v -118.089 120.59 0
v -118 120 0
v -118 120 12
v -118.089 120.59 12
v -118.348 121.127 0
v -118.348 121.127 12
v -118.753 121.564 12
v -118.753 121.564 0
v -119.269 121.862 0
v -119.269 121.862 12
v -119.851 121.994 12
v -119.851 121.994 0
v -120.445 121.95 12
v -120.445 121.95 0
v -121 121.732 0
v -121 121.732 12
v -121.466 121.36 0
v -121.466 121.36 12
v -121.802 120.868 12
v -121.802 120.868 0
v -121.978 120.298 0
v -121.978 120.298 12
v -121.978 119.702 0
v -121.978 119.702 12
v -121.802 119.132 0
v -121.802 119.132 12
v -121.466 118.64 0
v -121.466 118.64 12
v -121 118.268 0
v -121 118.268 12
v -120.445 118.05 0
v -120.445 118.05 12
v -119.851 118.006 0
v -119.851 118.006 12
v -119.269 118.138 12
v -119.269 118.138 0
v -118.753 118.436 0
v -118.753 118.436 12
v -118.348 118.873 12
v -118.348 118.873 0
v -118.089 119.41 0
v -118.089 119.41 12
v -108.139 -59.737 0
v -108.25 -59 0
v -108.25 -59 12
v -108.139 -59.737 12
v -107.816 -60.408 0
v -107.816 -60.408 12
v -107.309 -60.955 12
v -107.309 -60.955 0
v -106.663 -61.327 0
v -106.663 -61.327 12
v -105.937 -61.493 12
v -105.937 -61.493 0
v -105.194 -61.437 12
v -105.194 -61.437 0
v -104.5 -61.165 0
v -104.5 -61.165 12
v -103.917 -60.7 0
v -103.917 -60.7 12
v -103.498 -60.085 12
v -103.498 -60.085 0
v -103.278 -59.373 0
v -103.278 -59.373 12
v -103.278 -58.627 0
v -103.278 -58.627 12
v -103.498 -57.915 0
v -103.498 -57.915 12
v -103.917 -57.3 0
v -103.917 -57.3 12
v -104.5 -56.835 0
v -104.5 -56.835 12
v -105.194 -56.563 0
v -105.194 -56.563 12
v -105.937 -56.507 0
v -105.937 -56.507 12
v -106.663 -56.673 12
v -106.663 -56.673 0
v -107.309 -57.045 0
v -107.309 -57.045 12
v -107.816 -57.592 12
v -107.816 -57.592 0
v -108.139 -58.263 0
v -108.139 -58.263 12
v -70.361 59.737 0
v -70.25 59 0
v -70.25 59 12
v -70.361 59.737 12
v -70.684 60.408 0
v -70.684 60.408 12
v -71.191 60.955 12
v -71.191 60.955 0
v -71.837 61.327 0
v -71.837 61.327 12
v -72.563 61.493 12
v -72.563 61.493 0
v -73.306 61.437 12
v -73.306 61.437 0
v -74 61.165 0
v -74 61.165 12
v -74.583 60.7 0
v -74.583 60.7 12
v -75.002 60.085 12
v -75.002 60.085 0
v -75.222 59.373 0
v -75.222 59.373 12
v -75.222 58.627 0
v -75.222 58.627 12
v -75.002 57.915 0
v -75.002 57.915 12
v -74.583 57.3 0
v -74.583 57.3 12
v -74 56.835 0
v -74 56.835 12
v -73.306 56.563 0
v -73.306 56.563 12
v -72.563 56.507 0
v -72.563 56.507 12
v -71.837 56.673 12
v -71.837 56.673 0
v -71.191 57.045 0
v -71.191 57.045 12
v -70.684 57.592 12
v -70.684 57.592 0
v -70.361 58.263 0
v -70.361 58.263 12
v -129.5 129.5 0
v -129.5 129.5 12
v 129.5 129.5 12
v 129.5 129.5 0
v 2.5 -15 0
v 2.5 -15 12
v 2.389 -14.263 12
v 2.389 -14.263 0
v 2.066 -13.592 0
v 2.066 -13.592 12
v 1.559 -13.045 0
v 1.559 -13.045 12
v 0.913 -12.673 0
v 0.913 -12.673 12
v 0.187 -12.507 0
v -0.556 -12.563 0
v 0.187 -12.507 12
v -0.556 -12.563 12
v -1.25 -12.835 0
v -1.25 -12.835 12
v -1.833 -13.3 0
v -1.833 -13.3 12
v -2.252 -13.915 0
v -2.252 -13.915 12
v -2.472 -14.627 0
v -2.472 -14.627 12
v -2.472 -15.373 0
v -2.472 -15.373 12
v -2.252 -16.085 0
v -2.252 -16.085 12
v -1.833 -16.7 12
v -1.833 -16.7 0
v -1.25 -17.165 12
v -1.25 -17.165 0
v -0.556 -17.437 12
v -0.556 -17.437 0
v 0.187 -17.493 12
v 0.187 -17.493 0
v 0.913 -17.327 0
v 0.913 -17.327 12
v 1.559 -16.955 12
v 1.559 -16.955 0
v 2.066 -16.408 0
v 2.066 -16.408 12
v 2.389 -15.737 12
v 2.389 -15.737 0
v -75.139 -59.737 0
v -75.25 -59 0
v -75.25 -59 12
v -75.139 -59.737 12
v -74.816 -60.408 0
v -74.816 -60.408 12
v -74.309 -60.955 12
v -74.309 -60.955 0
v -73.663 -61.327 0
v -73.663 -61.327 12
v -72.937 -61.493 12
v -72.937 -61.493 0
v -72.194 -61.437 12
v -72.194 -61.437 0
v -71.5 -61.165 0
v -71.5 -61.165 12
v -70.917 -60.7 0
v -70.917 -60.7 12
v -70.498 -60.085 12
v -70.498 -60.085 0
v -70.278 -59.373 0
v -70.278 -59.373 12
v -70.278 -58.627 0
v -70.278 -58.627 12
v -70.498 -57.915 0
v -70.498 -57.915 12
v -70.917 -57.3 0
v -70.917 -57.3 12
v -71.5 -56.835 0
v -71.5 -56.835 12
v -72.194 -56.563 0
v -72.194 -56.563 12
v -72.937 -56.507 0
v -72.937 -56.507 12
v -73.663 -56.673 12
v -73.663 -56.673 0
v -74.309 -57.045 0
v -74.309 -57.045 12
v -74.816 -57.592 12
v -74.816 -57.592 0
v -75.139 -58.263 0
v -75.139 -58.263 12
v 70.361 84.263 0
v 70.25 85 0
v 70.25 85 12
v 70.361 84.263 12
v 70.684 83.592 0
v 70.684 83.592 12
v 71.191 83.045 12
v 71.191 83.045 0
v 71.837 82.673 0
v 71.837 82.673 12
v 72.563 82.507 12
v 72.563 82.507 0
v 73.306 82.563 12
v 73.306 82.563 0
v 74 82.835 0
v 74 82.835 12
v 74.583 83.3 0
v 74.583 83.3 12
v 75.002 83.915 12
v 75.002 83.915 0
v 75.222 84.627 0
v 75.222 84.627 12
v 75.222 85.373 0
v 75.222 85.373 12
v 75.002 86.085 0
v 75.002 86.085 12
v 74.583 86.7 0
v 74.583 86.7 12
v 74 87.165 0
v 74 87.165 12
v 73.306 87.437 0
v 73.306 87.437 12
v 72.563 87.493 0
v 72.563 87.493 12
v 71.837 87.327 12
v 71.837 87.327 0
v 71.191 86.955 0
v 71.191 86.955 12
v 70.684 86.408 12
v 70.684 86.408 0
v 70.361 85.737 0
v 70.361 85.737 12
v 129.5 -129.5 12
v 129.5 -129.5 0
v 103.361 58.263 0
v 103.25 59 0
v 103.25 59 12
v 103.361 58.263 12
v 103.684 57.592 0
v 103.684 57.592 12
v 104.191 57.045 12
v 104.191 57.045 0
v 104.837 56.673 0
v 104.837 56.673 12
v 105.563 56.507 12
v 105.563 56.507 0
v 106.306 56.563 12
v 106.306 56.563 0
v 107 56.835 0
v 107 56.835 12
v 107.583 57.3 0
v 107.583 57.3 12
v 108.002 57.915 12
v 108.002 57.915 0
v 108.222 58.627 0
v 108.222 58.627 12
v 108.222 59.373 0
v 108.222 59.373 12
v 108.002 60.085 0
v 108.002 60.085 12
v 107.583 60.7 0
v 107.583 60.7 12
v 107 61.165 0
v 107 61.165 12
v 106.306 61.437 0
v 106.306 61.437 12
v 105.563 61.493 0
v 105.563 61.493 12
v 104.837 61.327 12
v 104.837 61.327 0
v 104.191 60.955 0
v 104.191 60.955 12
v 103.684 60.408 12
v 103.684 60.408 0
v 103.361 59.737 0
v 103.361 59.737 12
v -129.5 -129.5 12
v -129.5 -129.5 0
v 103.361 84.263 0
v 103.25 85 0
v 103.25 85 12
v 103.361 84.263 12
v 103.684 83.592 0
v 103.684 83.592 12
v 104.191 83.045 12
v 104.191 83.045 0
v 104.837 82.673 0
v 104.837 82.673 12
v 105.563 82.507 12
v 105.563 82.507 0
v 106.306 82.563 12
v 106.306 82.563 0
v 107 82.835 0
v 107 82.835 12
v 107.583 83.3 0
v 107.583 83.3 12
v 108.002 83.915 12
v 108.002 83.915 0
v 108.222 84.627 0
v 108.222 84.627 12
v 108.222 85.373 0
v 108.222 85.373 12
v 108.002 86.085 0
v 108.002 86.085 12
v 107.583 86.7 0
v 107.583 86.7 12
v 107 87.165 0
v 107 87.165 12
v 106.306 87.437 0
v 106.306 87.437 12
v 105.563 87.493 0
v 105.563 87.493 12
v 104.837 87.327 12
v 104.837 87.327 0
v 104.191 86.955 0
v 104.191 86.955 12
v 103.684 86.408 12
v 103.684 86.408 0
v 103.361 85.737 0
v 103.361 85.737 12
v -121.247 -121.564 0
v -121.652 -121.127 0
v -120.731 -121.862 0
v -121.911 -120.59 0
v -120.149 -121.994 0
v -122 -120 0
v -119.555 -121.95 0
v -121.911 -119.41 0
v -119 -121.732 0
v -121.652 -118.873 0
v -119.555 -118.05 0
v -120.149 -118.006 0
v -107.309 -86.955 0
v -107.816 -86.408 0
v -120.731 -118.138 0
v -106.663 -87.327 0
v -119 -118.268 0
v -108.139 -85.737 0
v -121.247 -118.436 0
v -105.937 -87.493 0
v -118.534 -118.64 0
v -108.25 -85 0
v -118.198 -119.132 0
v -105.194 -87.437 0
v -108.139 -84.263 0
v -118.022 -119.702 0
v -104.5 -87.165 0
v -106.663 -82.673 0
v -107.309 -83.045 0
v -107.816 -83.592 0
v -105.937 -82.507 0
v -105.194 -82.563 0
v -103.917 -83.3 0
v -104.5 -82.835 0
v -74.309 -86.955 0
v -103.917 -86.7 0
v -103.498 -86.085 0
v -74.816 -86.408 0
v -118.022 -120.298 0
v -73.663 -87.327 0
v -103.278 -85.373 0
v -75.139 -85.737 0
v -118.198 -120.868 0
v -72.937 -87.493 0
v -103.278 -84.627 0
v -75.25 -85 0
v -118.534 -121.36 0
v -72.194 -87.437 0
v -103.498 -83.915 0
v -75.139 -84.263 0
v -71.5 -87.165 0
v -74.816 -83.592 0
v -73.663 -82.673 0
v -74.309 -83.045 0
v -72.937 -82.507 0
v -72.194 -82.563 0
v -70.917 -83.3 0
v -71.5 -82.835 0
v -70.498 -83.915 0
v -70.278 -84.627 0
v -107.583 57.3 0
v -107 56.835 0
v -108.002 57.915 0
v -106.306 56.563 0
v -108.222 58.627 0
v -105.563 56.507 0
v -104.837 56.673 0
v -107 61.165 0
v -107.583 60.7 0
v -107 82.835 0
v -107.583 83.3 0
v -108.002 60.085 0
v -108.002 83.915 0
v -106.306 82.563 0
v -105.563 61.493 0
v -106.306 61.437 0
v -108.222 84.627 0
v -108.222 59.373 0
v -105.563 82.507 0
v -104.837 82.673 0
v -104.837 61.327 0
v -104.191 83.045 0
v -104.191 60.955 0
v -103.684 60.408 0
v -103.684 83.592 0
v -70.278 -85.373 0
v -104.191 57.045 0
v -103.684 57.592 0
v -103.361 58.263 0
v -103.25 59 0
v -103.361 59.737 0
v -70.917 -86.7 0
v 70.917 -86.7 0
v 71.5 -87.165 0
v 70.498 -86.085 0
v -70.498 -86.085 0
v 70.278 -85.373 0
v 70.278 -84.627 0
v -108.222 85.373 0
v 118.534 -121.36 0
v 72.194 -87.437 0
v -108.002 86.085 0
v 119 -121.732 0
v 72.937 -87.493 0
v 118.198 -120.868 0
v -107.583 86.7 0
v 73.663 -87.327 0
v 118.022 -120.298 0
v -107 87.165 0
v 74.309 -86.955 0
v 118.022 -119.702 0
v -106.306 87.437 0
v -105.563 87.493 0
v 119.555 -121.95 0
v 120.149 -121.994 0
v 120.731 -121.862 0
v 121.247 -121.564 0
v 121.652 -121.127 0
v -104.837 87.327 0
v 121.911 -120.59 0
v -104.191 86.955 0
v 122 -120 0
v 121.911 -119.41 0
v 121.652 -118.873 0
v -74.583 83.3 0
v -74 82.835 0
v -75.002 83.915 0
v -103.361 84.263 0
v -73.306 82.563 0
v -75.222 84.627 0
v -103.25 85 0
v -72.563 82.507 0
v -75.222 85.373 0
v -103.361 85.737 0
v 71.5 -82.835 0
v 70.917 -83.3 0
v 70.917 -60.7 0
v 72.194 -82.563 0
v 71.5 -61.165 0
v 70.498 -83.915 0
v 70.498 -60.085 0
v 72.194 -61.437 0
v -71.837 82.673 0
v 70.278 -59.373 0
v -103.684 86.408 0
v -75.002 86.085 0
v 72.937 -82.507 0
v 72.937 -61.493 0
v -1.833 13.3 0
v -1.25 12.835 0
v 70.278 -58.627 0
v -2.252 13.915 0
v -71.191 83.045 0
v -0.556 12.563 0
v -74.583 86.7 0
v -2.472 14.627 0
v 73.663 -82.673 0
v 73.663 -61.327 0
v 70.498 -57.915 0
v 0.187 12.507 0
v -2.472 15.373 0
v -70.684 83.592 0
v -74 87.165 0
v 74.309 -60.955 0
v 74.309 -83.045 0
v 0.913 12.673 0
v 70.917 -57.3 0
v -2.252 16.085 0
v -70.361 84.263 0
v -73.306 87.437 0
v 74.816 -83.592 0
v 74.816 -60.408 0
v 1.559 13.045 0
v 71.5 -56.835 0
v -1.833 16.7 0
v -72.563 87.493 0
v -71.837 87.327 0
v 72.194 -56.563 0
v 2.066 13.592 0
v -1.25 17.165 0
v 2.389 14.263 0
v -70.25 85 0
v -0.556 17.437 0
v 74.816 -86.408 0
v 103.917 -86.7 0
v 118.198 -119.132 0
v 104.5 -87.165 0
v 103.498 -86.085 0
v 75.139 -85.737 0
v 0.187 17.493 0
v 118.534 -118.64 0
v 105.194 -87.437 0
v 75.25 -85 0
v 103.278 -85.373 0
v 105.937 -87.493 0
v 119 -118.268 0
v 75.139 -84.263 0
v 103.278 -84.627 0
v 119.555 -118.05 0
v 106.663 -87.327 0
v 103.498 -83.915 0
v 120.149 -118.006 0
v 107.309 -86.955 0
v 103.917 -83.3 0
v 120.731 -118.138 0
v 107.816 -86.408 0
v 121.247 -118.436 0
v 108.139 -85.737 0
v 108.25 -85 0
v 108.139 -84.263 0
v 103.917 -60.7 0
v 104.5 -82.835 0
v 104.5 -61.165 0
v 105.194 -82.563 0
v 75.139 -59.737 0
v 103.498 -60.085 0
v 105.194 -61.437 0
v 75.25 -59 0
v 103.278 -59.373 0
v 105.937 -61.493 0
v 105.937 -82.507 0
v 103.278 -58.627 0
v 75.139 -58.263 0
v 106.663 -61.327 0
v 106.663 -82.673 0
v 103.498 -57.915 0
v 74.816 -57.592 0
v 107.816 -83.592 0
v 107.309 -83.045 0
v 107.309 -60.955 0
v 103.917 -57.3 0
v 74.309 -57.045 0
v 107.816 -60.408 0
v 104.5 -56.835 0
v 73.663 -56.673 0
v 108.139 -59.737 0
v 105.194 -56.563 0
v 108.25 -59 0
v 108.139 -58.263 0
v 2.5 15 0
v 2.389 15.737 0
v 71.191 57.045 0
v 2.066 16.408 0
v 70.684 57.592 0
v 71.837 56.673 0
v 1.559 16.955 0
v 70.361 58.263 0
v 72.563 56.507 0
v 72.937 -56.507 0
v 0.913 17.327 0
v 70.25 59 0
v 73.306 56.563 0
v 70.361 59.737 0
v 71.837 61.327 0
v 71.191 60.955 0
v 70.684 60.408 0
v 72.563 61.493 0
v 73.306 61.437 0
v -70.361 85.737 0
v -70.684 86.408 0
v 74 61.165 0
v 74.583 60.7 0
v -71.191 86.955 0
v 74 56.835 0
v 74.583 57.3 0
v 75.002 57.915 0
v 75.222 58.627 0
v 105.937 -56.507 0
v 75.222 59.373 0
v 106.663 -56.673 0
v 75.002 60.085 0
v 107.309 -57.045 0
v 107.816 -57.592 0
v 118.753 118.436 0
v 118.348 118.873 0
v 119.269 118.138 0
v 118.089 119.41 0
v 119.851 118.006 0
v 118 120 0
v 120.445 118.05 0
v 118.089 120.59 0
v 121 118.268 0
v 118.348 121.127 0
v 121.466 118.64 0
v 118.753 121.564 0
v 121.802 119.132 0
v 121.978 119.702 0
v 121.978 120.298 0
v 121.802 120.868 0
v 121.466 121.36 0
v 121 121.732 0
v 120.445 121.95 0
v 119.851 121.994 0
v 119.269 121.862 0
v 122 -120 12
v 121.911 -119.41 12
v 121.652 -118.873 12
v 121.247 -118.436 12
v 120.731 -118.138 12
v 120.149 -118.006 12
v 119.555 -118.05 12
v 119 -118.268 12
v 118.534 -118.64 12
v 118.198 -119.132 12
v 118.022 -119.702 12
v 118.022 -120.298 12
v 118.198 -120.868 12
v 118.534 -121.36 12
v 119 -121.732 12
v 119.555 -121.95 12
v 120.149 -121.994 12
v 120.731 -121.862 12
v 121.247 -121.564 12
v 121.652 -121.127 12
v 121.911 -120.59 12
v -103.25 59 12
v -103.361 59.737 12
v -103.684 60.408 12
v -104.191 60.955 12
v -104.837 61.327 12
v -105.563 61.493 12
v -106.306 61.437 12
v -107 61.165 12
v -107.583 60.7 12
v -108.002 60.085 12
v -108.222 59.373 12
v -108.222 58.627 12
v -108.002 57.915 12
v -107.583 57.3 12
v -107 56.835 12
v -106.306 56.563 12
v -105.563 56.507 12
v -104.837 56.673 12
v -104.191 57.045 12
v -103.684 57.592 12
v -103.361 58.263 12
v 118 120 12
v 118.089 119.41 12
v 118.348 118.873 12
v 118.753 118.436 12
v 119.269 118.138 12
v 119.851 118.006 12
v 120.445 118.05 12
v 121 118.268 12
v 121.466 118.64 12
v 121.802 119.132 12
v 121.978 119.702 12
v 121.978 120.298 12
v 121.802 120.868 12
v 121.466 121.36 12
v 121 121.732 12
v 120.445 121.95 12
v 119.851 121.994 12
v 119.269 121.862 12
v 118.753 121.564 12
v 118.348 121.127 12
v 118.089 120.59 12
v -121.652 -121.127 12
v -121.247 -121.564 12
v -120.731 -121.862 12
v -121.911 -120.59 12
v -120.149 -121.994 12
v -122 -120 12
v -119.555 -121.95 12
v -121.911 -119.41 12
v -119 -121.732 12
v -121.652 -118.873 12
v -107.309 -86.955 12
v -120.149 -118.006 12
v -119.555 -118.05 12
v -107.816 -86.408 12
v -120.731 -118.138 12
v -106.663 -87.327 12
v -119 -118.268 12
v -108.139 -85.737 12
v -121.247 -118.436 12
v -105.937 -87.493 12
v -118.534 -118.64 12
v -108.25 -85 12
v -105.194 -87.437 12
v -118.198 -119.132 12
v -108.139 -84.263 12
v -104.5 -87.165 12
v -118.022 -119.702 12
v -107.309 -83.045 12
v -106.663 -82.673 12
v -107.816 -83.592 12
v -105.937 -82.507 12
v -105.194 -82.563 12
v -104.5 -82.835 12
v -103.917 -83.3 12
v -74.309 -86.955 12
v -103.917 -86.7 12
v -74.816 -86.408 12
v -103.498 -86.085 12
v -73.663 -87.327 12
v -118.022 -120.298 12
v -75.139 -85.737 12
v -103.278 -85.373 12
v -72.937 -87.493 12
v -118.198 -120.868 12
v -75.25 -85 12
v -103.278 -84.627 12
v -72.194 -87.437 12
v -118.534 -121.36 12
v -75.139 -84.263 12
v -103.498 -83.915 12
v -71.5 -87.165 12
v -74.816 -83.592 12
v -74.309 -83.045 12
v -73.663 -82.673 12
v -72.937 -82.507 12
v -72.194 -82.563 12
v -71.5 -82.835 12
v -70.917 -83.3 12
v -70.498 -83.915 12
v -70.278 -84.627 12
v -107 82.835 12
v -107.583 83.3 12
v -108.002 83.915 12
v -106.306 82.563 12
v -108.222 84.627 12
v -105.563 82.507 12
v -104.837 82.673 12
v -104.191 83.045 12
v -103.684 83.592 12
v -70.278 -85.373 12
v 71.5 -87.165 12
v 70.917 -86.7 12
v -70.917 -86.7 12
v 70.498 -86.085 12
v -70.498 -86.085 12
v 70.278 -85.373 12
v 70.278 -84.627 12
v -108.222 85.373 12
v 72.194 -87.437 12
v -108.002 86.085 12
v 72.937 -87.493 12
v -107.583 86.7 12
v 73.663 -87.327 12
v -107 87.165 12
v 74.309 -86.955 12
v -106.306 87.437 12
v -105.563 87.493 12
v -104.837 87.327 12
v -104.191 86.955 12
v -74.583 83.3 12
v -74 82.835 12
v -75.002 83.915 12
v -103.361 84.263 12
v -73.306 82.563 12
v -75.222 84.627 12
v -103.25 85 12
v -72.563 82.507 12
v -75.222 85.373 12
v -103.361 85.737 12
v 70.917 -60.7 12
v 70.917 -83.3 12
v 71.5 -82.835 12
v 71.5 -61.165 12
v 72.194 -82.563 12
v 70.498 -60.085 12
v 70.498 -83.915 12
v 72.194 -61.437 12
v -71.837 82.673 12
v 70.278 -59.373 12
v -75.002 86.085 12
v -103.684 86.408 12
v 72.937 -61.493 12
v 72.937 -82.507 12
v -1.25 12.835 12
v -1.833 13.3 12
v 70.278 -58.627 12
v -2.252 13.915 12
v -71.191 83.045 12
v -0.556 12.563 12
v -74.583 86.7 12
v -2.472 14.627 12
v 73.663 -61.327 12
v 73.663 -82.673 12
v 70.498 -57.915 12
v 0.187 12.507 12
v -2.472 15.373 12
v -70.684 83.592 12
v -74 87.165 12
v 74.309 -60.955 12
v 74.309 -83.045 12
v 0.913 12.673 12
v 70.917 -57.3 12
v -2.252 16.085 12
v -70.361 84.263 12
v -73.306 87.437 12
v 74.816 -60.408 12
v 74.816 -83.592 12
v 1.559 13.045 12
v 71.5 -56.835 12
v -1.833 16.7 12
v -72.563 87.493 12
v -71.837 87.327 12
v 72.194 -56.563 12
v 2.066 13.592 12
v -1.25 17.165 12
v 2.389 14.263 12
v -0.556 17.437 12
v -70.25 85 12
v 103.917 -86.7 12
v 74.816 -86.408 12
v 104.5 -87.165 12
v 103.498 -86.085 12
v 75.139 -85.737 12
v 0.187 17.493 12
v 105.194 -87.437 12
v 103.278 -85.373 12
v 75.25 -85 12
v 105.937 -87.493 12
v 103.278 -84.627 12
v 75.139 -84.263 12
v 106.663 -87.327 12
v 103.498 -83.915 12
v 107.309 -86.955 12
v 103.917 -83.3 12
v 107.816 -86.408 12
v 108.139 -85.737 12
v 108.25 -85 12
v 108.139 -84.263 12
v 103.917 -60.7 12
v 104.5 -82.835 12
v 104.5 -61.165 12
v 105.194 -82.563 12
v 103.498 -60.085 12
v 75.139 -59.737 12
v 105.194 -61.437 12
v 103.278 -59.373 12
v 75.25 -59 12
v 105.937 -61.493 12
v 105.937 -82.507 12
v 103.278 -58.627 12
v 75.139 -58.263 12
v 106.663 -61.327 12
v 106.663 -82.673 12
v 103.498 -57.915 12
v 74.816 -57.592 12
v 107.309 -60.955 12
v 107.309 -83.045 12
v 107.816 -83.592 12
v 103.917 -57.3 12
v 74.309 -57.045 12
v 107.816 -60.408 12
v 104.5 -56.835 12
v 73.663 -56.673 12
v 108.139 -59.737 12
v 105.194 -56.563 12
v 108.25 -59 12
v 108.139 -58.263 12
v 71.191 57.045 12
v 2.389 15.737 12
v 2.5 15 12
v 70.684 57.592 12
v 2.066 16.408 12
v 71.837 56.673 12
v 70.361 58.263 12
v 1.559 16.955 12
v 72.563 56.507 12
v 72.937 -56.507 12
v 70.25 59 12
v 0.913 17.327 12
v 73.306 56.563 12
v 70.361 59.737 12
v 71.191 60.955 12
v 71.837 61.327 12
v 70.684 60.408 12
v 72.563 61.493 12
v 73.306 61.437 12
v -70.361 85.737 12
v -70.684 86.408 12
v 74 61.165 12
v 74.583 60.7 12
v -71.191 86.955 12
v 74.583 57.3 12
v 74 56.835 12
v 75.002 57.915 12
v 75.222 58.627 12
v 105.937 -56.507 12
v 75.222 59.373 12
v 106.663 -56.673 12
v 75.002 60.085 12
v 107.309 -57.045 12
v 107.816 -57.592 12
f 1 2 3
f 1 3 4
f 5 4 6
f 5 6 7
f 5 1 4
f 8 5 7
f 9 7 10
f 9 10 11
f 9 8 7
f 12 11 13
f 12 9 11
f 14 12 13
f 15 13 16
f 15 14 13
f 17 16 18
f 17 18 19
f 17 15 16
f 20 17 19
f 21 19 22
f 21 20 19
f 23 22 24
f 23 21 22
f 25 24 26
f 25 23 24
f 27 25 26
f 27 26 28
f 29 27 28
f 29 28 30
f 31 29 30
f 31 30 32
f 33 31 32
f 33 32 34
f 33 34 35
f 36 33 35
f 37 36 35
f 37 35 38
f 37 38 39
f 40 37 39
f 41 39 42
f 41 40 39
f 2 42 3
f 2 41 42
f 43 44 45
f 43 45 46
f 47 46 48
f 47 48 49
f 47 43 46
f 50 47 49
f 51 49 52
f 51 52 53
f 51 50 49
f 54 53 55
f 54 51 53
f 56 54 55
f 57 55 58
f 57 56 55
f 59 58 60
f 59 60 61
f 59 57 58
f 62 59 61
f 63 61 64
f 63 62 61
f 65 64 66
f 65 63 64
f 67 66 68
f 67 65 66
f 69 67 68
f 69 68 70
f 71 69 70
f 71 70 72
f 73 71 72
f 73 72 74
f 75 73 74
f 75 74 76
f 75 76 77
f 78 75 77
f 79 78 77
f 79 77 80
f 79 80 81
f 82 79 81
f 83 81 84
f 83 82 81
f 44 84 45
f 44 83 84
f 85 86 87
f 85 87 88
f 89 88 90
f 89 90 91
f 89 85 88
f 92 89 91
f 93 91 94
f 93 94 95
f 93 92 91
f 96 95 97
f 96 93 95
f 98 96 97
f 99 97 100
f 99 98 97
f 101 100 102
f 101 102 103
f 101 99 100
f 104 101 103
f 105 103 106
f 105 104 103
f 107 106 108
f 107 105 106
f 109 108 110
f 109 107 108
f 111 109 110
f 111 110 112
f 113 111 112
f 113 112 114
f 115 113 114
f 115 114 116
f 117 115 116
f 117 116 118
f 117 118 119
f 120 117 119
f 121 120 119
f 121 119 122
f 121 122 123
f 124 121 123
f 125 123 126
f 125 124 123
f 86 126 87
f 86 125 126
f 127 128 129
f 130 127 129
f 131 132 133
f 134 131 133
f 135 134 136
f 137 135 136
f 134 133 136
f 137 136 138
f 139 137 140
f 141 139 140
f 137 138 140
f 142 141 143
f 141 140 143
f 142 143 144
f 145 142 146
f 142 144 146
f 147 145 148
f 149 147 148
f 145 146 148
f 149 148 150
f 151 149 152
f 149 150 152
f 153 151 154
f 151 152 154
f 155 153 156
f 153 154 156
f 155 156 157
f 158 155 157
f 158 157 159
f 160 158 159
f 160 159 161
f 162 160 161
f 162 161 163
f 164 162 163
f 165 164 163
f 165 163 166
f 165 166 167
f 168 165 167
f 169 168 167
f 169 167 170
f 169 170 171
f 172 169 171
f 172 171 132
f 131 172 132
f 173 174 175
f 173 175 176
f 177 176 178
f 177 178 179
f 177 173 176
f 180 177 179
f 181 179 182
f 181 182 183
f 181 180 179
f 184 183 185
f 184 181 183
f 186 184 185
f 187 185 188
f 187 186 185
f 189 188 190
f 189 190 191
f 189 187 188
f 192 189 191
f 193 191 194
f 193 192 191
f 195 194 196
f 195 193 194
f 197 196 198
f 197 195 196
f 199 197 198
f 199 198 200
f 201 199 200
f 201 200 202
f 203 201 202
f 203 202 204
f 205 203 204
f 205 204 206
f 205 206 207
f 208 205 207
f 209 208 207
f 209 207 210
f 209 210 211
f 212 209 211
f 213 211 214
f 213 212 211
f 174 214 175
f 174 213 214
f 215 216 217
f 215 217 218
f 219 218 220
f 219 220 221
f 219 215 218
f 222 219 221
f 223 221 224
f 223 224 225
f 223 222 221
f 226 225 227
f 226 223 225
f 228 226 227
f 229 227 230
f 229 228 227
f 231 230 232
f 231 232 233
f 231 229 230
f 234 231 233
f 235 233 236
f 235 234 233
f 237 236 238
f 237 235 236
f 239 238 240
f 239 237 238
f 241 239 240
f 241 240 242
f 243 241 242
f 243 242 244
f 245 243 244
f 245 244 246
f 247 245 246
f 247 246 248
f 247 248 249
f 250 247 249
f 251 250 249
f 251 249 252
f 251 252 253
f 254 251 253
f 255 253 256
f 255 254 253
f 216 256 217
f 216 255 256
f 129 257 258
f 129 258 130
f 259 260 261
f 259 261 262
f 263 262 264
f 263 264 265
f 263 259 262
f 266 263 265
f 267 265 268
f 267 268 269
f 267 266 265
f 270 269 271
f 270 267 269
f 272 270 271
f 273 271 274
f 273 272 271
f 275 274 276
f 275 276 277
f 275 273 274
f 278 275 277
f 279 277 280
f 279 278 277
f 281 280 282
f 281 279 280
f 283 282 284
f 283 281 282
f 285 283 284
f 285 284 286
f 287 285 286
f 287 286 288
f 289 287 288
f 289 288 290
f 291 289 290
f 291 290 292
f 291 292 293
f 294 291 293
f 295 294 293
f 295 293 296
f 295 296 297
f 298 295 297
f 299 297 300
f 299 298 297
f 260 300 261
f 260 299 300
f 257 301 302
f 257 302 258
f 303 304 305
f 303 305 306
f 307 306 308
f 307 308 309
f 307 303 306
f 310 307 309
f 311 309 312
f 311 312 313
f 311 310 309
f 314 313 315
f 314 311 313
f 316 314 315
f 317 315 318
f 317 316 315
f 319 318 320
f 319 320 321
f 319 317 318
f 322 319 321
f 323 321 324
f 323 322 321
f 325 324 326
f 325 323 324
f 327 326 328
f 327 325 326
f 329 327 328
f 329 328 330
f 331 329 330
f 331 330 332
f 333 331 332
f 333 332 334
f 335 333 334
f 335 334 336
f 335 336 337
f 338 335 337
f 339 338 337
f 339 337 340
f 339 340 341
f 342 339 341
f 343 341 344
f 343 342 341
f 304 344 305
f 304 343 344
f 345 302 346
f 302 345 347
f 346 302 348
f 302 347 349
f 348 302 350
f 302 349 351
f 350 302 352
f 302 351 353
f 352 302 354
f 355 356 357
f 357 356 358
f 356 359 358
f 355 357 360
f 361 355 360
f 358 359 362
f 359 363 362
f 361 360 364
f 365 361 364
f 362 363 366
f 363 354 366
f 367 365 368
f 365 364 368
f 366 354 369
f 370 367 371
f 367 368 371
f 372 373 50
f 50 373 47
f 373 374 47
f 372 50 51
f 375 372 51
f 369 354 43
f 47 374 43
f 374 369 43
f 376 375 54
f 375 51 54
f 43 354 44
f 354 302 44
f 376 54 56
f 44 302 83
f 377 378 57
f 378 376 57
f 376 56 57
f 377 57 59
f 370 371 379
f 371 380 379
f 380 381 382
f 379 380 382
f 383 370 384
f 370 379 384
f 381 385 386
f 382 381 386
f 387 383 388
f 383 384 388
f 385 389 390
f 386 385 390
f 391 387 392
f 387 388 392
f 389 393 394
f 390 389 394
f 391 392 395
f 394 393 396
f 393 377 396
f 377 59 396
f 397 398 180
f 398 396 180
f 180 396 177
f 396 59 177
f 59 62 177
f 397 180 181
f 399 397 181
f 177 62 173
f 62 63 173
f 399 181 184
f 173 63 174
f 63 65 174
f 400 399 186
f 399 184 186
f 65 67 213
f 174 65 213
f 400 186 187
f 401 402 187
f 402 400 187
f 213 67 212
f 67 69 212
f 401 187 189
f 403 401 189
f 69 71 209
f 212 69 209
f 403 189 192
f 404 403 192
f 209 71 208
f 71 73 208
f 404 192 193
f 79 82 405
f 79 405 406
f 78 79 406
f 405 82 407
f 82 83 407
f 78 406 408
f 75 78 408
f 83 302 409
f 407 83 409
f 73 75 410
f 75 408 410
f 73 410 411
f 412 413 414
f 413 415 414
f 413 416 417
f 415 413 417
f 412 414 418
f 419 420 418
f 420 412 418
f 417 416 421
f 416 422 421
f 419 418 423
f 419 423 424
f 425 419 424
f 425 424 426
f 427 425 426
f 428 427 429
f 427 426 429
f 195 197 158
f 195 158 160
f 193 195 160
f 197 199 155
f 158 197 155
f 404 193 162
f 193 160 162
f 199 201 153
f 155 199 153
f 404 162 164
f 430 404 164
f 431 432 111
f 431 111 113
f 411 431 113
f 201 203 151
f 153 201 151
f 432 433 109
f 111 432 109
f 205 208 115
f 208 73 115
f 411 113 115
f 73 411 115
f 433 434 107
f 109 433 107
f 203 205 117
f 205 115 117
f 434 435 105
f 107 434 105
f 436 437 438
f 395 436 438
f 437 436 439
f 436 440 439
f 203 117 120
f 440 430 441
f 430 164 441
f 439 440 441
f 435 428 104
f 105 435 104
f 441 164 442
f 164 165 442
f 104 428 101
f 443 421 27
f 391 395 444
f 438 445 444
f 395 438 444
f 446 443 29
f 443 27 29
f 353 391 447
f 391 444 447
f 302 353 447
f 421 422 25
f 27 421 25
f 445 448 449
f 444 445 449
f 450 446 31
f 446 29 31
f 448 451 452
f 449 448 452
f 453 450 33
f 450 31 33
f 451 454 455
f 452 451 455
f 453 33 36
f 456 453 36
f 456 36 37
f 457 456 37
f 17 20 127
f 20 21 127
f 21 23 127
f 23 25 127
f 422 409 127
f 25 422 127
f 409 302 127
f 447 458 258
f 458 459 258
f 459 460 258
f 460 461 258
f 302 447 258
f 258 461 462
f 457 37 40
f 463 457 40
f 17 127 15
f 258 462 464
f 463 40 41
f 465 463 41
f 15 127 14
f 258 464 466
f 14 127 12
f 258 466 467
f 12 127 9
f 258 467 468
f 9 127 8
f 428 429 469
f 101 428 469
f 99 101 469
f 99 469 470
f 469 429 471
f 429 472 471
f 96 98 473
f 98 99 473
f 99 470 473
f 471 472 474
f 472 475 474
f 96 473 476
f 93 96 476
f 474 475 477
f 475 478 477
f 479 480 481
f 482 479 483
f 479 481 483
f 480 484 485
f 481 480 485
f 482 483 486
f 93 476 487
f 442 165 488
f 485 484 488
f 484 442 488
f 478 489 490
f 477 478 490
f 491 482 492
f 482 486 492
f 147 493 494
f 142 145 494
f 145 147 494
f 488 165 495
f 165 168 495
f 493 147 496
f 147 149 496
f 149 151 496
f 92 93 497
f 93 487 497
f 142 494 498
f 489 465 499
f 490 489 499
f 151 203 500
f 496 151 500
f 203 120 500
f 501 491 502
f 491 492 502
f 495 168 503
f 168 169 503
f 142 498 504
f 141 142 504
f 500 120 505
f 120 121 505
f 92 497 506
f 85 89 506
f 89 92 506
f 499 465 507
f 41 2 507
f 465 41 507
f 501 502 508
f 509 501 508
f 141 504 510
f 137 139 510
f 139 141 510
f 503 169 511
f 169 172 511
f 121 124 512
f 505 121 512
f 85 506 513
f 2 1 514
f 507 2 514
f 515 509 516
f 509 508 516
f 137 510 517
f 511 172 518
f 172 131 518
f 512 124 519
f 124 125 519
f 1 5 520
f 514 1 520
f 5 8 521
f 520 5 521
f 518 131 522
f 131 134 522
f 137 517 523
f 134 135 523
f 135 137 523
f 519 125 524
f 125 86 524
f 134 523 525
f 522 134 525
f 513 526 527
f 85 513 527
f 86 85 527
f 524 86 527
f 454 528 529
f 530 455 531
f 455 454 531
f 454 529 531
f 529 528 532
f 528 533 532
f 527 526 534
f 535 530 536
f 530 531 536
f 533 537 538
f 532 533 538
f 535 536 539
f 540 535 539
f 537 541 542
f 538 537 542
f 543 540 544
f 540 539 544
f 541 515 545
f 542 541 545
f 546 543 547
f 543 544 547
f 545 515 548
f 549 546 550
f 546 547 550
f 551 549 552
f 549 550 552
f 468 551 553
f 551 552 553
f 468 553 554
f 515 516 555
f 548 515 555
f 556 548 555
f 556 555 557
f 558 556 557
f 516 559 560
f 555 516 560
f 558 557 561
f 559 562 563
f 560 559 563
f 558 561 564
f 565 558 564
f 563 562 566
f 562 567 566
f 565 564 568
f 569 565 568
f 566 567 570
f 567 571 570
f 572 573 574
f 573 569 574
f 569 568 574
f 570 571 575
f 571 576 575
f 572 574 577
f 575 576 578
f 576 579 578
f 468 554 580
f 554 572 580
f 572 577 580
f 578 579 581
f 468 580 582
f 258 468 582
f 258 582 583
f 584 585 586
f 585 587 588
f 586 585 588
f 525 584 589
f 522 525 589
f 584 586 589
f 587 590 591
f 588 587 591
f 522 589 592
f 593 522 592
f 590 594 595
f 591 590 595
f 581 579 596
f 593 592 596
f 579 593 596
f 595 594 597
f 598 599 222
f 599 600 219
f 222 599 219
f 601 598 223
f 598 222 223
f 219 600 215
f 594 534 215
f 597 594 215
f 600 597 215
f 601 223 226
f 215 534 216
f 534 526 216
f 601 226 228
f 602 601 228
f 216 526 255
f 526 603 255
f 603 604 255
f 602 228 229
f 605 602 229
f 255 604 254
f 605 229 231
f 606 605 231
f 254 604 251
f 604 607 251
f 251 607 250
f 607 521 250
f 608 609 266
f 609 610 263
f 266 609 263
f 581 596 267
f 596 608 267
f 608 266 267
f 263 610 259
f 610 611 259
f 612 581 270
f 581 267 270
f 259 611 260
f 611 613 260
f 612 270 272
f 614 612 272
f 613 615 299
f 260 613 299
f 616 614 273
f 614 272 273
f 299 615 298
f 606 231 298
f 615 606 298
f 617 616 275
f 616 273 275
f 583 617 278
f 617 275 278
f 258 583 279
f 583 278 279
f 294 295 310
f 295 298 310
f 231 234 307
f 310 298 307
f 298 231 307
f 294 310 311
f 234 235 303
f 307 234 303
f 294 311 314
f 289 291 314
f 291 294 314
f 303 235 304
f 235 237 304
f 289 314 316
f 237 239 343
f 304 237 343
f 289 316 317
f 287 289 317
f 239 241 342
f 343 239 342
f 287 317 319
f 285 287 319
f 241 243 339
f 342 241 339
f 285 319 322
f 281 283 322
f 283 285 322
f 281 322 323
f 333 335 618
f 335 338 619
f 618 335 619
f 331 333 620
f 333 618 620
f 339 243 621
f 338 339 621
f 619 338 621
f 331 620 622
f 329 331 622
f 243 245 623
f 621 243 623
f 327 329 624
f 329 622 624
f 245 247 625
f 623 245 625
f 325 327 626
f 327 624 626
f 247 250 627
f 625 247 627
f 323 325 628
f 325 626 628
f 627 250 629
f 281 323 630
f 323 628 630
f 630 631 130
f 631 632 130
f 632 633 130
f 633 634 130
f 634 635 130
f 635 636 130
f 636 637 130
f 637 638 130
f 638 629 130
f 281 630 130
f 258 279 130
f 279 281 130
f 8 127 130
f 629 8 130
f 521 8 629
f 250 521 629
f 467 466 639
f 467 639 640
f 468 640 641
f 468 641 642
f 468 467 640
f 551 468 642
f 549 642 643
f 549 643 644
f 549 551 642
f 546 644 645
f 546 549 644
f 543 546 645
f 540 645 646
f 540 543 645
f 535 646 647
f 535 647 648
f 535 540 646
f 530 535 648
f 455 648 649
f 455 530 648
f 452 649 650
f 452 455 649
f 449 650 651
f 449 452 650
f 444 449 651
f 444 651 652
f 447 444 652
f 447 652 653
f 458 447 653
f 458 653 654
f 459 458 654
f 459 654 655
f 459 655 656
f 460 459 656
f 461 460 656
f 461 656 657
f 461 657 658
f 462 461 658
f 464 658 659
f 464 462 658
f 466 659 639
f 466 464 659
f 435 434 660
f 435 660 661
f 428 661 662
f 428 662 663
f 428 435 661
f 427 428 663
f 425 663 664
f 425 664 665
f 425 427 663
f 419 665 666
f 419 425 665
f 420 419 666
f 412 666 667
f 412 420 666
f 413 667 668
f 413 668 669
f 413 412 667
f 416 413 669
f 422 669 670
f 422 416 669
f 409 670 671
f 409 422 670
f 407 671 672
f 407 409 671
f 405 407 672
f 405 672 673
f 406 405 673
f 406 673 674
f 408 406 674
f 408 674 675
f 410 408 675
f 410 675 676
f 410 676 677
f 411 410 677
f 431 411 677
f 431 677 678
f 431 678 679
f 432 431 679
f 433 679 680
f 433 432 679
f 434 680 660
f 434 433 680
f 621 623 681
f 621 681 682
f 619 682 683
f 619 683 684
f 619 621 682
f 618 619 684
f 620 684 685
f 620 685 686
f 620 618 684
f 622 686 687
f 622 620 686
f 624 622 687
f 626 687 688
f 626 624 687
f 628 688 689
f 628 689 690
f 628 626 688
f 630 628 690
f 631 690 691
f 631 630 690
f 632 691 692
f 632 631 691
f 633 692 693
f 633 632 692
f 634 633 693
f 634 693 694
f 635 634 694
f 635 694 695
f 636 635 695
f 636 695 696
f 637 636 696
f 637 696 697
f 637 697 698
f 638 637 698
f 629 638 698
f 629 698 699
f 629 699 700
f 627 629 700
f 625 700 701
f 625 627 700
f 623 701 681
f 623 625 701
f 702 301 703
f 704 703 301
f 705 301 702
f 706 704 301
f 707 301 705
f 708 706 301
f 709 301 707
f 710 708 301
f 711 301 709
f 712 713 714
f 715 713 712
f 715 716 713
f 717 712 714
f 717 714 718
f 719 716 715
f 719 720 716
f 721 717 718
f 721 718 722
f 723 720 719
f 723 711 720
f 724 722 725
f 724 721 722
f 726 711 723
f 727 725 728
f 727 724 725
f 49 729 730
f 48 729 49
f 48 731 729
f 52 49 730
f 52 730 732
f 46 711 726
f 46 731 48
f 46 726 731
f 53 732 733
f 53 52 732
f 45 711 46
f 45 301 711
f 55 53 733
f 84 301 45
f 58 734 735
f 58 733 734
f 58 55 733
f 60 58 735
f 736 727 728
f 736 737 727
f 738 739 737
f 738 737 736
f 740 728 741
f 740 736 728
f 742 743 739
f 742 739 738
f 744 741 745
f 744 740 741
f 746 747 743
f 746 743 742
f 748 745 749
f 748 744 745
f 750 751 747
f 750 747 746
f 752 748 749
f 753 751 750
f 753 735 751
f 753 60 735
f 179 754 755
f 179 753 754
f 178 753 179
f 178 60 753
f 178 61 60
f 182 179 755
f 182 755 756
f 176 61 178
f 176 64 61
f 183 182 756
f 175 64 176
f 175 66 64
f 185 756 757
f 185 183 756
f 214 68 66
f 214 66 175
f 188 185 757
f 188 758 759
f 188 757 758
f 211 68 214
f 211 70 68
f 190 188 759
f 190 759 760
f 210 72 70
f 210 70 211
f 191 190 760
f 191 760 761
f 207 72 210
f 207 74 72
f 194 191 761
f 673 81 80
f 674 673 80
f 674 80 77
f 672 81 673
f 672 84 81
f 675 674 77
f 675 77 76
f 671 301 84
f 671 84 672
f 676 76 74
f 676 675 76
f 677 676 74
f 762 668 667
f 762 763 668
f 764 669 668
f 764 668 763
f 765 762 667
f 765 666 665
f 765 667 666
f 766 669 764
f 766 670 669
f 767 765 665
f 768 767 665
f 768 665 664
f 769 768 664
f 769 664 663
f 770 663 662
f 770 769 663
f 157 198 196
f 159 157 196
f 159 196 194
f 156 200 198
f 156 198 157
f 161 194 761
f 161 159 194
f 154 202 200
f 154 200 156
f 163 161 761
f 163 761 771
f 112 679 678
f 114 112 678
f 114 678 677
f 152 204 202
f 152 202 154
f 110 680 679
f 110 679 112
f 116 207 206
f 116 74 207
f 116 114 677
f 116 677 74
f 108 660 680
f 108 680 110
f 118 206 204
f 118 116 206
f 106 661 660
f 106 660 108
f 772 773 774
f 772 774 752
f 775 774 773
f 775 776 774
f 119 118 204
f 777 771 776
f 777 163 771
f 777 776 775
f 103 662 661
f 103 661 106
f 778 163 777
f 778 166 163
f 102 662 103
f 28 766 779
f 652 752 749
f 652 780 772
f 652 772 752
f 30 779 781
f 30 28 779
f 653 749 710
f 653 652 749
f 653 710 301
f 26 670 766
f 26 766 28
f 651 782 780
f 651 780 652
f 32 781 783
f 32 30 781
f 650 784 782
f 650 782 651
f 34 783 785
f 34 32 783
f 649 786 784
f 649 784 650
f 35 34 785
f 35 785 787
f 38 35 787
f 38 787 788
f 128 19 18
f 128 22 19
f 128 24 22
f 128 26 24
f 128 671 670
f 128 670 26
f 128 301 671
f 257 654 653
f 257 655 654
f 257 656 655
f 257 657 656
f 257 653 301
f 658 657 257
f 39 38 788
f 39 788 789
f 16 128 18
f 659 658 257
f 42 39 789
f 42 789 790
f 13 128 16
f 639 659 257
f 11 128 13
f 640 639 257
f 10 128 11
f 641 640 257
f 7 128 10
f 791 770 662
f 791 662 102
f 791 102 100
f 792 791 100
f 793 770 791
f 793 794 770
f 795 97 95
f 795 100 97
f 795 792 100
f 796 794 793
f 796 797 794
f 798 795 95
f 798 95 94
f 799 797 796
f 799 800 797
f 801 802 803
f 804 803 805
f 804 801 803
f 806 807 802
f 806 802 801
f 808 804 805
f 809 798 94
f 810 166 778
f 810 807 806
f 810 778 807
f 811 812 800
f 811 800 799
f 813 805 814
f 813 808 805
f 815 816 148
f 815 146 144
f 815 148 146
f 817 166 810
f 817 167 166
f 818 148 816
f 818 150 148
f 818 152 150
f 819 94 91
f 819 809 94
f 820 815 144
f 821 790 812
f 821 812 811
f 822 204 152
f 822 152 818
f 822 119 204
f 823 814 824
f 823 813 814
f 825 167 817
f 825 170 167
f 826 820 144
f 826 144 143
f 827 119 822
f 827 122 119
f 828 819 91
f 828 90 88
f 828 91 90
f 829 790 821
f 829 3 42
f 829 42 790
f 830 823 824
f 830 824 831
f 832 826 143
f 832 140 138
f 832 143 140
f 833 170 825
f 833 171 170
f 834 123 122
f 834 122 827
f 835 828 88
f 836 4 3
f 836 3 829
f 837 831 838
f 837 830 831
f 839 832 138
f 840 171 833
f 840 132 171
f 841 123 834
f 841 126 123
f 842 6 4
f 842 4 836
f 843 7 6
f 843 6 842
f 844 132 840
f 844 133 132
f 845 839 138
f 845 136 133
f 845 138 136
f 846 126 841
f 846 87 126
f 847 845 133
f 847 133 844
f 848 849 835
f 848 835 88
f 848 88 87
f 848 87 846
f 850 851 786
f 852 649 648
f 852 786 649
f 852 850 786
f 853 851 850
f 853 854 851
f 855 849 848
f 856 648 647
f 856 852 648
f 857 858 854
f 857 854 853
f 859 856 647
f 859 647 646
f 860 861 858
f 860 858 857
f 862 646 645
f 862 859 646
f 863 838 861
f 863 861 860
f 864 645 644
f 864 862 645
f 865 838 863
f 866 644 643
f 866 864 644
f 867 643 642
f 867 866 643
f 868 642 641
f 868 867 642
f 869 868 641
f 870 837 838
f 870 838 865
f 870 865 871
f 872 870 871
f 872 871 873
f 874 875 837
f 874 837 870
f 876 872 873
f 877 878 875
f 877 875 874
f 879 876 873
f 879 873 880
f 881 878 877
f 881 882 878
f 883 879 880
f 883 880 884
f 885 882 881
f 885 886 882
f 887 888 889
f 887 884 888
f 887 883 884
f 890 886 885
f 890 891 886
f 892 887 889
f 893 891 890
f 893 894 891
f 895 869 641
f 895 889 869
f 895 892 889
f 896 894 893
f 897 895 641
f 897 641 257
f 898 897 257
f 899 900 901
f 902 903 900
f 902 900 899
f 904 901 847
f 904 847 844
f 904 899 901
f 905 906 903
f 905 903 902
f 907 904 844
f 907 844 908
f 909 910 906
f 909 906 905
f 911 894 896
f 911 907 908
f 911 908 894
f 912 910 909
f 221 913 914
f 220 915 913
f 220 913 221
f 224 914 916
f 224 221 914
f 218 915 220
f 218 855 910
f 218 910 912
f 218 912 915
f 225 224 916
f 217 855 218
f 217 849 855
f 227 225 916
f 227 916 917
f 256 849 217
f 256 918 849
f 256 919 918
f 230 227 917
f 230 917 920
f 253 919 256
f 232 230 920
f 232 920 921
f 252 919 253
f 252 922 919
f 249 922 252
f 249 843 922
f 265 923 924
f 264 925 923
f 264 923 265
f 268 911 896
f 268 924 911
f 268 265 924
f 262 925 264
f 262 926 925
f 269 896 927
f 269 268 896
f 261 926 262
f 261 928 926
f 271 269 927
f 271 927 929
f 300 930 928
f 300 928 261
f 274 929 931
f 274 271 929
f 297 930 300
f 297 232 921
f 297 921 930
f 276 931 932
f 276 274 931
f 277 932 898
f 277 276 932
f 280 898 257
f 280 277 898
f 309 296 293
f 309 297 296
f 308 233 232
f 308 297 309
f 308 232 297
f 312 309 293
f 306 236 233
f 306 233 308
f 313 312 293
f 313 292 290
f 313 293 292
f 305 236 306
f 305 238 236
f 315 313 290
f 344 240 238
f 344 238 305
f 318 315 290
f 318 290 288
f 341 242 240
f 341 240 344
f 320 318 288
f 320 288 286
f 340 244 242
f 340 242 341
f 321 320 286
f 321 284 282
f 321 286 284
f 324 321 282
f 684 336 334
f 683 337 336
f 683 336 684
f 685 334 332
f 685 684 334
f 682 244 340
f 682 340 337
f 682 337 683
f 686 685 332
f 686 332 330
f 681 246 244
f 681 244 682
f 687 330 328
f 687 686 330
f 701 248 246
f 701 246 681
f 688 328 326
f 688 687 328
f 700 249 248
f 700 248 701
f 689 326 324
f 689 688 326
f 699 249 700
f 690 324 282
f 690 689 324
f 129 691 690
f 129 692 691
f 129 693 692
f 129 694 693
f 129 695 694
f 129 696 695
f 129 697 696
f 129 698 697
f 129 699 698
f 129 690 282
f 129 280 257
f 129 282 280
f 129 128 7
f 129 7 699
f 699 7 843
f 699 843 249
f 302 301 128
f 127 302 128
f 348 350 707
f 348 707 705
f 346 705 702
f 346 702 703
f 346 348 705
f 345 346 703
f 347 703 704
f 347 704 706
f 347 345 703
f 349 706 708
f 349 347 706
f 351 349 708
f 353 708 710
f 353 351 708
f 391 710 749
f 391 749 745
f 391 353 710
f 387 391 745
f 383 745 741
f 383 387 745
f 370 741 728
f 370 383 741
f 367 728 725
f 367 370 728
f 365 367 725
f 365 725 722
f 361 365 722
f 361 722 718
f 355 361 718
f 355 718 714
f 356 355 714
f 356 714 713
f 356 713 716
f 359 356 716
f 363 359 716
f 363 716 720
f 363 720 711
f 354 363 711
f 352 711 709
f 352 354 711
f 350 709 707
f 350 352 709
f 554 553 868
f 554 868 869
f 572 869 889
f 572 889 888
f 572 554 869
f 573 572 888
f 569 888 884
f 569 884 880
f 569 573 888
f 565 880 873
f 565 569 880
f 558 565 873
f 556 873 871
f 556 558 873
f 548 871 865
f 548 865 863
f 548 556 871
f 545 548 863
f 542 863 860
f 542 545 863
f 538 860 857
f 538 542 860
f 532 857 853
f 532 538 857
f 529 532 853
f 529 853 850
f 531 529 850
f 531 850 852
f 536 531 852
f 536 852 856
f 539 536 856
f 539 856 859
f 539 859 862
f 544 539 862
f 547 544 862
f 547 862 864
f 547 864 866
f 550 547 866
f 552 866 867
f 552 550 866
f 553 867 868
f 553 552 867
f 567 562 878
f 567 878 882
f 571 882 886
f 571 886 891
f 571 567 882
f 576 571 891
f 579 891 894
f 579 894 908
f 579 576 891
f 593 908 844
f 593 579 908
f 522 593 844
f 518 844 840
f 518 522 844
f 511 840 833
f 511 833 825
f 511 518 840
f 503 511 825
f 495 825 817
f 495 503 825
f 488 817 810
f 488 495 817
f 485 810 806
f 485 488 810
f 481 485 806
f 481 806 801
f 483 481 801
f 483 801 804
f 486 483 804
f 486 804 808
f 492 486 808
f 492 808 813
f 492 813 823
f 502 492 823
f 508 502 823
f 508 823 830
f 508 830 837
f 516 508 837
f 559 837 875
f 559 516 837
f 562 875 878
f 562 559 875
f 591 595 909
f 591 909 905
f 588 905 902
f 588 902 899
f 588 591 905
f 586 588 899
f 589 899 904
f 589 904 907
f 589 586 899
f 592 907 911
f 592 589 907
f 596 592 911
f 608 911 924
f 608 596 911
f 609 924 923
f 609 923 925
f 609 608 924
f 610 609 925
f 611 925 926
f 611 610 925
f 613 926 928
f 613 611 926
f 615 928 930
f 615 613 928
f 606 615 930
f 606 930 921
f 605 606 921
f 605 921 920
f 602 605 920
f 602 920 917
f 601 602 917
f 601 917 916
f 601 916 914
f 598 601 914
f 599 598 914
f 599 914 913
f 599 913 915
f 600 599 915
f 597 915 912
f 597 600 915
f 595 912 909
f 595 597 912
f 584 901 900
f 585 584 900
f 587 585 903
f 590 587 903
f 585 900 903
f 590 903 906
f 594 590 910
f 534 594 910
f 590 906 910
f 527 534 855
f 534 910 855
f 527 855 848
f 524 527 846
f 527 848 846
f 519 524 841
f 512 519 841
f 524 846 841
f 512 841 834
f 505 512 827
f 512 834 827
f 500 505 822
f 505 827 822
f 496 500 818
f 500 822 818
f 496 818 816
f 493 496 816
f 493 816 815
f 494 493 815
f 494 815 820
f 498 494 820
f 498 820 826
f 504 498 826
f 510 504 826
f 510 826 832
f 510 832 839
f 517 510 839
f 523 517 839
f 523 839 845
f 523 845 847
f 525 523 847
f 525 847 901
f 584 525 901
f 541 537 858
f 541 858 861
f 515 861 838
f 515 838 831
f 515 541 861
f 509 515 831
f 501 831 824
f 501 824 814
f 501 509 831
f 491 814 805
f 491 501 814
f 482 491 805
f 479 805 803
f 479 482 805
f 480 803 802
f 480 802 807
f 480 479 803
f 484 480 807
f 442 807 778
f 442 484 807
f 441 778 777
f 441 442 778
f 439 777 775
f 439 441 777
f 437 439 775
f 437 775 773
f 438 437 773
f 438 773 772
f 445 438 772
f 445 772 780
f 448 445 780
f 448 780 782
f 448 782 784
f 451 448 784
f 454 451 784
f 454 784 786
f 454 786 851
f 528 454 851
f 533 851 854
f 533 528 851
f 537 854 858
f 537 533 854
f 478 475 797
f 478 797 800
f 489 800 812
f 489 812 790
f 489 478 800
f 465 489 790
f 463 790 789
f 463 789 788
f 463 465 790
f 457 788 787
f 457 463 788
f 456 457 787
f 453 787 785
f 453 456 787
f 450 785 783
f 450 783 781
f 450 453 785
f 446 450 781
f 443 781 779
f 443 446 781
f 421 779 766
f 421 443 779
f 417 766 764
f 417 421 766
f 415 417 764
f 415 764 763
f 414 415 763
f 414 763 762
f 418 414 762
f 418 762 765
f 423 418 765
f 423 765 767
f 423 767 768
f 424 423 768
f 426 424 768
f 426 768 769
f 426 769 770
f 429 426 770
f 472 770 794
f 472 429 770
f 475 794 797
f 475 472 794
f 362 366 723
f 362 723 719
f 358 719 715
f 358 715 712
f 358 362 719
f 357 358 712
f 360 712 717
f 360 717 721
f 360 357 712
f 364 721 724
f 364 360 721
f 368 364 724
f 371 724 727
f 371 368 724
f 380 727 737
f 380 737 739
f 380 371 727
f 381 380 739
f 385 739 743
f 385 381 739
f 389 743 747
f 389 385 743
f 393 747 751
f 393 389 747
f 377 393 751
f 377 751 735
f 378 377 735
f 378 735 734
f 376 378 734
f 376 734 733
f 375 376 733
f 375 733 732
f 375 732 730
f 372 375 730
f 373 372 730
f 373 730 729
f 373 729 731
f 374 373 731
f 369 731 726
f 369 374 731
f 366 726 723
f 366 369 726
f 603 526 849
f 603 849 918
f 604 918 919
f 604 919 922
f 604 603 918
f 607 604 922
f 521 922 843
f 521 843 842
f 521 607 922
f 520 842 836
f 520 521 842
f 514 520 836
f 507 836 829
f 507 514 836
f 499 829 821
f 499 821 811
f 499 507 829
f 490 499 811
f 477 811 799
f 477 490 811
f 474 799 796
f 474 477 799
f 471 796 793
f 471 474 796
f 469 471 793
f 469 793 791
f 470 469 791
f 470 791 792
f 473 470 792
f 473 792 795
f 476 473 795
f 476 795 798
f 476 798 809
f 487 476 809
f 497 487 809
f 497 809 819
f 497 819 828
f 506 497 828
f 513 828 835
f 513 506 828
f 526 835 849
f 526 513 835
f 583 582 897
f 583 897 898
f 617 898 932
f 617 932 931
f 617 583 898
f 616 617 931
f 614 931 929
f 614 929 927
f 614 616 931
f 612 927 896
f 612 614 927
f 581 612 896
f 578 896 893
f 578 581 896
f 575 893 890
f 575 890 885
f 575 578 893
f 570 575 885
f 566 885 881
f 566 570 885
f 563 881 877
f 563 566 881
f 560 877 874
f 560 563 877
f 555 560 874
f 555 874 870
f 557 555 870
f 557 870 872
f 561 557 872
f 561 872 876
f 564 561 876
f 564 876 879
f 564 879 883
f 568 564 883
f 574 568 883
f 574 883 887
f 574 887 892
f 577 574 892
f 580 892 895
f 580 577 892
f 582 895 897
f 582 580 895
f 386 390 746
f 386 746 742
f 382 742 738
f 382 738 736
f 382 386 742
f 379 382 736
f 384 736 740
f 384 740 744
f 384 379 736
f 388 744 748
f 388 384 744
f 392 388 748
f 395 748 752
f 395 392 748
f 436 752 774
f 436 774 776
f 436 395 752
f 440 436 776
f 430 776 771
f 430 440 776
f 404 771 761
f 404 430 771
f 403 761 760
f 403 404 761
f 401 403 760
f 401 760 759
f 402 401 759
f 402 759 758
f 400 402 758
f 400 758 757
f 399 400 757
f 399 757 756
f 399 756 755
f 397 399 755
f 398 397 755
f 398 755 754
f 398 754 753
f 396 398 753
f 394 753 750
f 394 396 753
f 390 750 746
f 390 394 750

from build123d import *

# Parameters (mm, degrees)
IZIM1_W                     = 320
IZIM1_H                     = 320
IZIM1_R                     = 2.5
IZIM1_R_2                   = 2
Y_KSEKLIK_EKSTR_ZYON1_DEPTH = 12
SKETCH2_W                   = 320
SKETCH2_H                   = 320
SKETCH2_W_2                 = 310
SKETCH2_H_2                 = 310
CUT_EXTRUDE1_DEPTH          = 10
SKETCH3_OUTSIDE_W           = 412.542
SKETCH3_OUTSIDE_H           = 412.542
SKETCH3_OUTSIDE_W_2         = 259
SKETCH3_OUTSIDE_H_2         = 259
CUT_EXTRUDE2_DEPTH          = 227.592144612
SKETCH4_R                   = 2.5
CUT_EXTRUDE3_DEPTH          = 184.533375711


with BuildPart() as part:
    # Çizim1 → Yükseklik-Ekstrüzyon1 (new body)
    with BuildSketch(Plane.XY):
        Rectangle(IZIM1_W, IZIM1_H)
        with Locations((-105.75, 85)):
            Circle(IZIM1_R, mode=Mode.SUBTRACT)
        with Locations((-72.75, 85)):
            Circle(IZIM1_R, mode=Mode.SUBTRACT)
        with Locations((-105.75, 59)):
            Circle(IZIM1_R, mode=Mode.SUBTRACT)
        with Locations((-72.75, 59)):
            Circle(IZIM1_R, mode=Mode.SUBTRACT)
        with Locations((-120, 120)):
            Circle(IZIM1_R_2, mode=Mode.SUBTRACT)
        with Locations(Location((-105.75, -59, 0), (0, 0, 180))):
            Circle(IZIM1_R, mode=Mode.SUBTRACT)
        with Locations(Location((-105.75, -85, 0), (0, 0, 180))):
            Circle(IZIM1_R, mode=Mode.SUBTRACT)
        with Locations(Location((-120, -120, 0), (0, 0, 180))):
            Circle(IZIM1_R_2, mode=Mode.SUBTRACT)
        with Locations(Location((-72.75, -59, 0), (0, 0, 180))):
            Circle(IZIM1_R, mode=Mode.SUBTRACT)
        with Locations(Location((-72.75, -85, 0), (0, 0, 180))):
            Circle(IZIM1_R, mode=Mode.SUBTRACT)
        with Locations((72.75, -85)):
            Circle(IZIM1_R, mode=Mode.SUBTRACT)
        with Locations((72.75, -59)):
            Circle(IZIM1_R, mode=Mode.SUBTRACT)
        with Locations((120, -120)):
            Circle(IZIM1_R_2, mode=Mode.SUBTRACT)
        with Locations((105.75, -85)):
            Circle(IZIM1_R, mode=Mode.SUBTRACT)
        with Locations((105.75, -59)):
            Circle(IZIM1_R, mode=Mode.SUBTRACT)
        with Locations(Location((120, 120, 0), (0, 0, 180))):
            Circle(IZIM1_R_2, mode=Mode.SUBTRACT)
        with Locations(Location((72.75, 59, 0), (0, 0, 180))):
            Circle(IZIM1_R, mode=Mode.SUBTRACT)
        with Locations(Location((105.75, 59, 0), (0, 0, 180))):
            Circle(IZIM1_R, mode=Mode.SUBTRACT)
        with Locations(Location((72.75, 85, 0), (0, 0, 180))):
            Circle(IZIM1_R, mode=Mode.SUBTRACT)
        with Locations(Location((105.75, 85, 0), (0, 0, 180))):
            Circle(IZIM1_R, mode=Mode.SUBTRACT)
    extrude(amount=Y_KSEKLIK_EKSTR_ZYON1_DEPTH)

    # Sketch2 → Cut-Extrude1 (cut)
    with BuildSketch(Plane.XY.offset(12)):
        Rectangle(SKETCH2_W, SKETCH2_H)
        Rectangle(SKETCH2_W_2, SKETCH2_H_2, mode=Mode.SUBTRACT)
    extrude(amount=-CUT_EXTRUDE1_DEPTH, mode=Mode.SUBTRACT)

    # Sketch3 outside → Cut-Extrude2 (cut, through all)
    with BuildSketch(Plane.XY.offset(12)):
        Rectangle(SKETCH3_OUTSIDE_W, SKETCH3_OUTSIDE_H)
        Rectangle(SKETCH3_OUTSIDE_W_2, SKETCH3_OUTSIDE_H_2, mode=Mode.SUBTRACT)
    extrude(amount=-CUT_EXTRUDE2_DEPTH, mode=Mode.SUBTRACT)

    # Sketch4 → Cut-Extrude3 (cut, through all)
    with BuildSketch(Plane.XY.offset(12)):
        with Locations((0, 15)):
            Circle(SKETCH4_R)
        with Locations((0, -15)):
            Circle(SKETCH4_R)
    extrude(amount=-CUT_EXTRUDE3_DEPTH, mode=Mode.SUBTRACT)


solid = part.part
